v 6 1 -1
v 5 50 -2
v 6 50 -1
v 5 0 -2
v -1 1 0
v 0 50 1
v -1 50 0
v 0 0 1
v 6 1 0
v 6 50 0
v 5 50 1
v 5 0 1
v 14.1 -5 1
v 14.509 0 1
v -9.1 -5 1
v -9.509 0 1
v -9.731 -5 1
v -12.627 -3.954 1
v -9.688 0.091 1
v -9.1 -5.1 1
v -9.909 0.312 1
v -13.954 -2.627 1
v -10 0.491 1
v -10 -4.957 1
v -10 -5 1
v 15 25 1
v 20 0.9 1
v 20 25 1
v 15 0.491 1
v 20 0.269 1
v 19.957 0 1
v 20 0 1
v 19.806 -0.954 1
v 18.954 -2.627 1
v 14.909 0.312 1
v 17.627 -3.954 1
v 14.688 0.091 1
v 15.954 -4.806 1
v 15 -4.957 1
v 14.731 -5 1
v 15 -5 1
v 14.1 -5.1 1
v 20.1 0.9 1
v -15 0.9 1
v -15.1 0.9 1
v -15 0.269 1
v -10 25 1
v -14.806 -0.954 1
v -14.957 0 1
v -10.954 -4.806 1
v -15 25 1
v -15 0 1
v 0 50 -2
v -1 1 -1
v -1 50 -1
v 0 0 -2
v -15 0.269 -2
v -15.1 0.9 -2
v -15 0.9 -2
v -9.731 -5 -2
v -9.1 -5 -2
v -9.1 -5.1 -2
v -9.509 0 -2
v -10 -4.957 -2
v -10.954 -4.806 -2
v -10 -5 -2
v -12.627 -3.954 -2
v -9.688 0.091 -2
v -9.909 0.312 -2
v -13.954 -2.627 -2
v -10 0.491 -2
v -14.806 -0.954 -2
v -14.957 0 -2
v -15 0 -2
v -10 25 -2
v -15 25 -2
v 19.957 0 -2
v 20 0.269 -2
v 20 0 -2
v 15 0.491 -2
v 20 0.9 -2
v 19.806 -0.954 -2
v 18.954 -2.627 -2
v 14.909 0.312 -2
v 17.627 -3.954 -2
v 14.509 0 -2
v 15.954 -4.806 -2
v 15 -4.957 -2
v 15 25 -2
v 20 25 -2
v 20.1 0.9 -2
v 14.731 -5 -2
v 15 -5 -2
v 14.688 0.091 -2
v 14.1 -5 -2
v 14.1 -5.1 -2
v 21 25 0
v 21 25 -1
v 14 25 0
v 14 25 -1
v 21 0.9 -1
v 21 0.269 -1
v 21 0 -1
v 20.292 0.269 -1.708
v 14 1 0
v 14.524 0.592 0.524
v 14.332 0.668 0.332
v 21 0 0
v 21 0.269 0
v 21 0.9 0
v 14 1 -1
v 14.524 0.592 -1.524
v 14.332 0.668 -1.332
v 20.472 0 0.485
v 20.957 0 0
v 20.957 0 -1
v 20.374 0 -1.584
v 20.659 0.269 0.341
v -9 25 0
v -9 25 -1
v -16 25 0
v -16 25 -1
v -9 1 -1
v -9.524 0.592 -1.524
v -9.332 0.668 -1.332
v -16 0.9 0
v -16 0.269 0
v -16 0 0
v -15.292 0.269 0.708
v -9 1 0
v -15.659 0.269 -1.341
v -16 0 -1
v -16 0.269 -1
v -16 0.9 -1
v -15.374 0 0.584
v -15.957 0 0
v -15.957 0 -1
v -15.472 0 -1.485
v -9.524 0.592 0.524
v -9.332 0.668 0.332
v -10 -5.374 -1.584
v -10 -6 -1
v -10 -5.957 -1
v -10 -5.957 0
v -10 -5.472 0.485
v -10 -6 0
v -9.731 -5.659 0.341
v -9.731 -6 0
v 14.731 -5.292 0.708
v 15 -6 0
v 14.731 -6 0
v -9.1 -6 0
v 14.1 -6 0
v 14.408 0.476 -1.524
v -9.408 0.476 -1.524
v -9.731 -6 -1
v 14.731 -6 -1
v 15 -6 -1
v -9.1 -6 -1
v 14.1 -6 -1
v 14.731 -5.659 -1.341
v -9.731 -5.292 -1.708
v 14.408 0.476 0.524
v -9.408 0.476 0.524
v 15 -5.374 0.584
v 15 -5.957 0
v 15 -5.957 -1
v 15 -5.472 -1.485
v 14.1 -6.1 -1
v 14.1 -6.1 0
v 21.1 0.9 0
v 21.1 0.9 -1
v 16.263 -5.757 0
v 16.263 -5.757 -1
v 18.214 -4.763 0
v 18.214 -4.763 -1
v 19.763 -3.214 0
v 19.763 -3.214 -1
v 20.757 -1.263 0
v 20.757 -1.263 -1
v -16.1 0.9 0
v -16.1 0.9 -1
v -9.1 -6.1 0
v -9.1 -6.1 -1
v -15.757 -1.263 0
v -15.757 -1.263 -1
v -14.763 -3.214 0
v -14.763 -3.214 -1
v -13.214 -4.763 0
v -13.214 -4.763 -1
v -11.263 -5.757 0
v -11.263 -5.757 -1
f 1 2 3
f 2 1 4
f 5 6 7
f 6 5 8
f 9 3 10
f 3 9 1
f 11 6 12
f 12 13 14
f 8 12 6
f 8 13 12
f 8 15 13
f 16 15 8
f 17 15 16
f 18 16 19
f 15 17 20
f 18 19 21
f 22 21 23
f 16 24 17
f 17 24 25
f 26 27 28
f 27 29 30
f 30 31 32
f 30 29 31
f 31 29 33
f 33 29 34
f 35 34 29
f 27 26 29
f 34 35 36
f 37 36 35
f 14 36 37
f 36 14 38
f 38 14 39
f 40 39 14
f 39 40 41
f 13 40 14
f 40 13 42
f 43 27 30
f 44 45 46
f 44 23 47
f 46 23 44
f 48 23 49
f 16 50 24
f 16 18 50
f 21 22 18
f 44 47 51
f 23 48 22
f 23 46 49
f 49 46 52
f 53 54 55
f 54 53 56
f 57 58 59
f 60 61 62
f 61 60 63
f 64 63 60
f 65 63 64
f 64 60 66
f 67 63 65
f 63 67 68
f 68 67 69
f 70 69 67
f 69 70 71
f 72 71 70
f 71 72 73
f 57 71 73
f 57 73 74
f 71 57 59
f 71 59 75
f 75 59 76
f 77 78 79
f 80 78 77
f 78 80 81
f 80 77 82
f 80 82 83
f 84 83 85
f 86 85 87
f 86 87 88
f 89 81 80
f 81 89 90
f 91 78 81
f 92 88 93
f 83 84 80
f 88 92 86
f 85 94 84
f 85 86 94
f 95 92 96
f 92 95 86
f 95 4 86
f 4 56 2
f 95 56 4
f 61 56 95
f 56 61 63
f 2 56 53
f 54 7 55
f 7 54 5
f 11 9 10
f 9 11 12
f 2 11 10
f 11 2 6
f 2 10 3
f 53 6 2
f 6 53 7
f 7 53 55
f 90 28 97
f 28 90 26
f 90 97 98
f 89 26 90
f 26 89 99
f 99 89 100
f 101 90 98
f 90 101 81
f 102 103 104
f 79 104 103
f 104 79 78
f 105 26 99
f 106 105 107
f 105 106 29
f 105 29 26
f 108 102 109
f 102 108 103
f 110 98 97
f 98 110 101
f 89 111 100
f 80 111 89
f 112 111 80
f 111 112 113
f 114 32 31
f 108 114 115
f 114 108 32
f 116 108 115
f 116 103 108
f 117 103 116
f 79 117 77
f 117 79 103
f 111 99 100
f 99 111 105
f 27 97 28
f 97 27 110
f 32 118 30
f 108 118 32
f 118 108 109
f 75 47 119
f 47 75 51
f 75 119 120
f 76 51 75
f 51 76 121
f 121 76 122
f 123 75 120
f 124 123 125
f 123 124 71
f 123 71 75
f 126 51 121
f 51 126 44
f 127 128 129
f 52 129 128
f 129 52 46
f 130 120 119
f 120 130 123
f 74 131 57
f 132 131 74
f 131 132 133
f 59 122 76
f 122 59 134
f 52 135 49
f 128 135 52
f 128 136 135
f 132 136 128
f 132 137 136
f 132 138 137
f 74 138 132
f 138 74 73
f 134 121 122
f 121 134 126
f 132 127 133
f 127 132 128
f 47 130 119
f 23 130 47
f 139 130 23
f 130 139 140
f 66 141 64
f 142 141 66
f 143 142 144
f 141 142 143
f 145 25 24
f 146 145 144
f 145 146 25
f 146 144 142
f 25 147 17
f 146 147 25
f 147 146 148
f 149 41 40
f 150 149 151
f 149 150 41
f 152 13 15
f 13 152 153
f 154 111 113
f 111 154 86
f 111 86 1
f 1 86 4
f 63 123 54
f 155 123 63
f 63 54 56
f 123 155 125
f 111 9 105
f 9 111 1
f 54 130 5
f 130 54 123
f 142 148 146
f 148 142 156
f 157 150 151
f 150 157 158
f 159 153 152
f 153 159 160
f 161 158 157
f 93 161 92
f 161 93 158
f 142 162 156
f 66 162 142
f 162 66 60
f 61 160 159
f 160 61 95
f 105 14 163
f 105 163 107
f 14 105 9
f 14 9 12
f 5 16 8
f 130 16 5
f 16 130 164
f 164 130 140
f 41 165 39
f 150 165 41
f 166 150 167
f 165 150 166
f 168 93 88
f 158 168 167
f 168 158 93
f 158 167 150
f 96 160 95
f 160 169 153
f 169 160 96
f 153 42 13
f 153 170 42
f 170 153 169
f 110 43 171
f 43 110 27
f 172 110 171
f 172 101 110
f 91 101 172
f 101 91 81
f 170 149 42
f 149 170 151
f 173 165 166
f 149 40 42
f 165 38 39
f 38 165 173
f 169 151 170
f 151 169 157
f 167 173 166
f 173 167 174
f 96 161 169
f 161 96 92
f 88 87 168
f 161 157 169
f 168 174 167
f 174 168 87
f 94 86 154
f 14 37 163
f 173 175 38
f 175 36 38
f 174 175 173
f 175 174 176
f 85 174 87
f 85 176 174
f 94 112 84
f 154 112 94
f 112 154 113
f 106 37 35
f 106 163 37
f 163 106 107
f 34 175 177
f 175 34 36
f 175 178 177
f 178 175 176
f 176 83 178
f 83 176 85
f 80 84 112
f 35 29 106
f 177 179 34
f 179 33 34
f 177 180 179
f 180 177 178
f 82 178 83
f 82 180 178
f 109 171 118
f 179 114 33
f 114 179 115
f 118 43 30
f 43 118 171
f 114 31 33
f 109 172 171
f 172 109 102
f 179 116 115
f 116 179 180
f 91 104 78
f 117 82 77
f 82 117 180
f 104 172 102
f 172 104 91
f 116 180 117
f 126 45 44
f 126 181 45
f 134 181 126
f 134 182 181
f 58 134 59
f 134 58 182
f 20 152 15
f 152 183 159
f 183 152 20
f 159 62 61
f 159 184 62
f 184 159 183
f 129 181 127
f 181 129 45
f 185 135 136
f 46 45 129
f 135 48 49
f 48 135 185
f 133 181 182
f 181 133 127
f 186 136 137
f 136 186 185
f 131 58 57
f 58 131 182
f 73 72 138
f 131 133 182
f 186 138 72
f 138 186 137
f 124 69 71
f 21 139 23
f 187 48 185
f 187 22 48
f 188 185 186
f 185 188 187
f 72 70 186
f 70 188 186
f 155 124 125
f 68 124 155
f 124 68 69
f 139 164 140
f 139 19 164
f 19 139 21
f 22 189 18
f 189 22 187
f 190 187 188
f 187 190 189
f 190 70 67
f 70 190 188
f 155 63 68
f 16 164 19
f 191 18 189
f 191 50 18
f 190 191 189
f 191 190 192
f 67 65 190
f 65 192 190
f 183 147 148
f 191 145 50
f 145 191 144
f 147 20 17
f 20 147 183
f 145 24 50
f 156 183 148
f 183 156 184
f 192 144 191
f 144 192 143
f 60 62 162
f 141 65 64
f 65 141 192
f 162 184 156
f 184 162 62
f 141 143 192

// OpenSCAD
module segment(length)
{
    rotate([-90, 0, 0])
    {
        linear_extrude(height=length)
        {
            offset(r = 1)
            {
                square([5,1]);
            }
        }
    }
}

module arc()
{
    rotate_extrude(angle = 90)
    {
        translate([1, 1, 0])
        {
            offset(r = 1)
            {
                square([5,1], center = false);
            }
        }
    }
}

segment(50);

translate([15, 0, 0])
    segment(25);

translate([-15, 0, 0])
    segment(25);

translate([15,-5,0])
    rotate([0,0,90])
        segment(25);

translate([14.1,0.9,-2])
    rotate([0,0,-90])
        arc();

translate([-9.1,0.9,-2])
    rotate([0,0,180])
        arc();
